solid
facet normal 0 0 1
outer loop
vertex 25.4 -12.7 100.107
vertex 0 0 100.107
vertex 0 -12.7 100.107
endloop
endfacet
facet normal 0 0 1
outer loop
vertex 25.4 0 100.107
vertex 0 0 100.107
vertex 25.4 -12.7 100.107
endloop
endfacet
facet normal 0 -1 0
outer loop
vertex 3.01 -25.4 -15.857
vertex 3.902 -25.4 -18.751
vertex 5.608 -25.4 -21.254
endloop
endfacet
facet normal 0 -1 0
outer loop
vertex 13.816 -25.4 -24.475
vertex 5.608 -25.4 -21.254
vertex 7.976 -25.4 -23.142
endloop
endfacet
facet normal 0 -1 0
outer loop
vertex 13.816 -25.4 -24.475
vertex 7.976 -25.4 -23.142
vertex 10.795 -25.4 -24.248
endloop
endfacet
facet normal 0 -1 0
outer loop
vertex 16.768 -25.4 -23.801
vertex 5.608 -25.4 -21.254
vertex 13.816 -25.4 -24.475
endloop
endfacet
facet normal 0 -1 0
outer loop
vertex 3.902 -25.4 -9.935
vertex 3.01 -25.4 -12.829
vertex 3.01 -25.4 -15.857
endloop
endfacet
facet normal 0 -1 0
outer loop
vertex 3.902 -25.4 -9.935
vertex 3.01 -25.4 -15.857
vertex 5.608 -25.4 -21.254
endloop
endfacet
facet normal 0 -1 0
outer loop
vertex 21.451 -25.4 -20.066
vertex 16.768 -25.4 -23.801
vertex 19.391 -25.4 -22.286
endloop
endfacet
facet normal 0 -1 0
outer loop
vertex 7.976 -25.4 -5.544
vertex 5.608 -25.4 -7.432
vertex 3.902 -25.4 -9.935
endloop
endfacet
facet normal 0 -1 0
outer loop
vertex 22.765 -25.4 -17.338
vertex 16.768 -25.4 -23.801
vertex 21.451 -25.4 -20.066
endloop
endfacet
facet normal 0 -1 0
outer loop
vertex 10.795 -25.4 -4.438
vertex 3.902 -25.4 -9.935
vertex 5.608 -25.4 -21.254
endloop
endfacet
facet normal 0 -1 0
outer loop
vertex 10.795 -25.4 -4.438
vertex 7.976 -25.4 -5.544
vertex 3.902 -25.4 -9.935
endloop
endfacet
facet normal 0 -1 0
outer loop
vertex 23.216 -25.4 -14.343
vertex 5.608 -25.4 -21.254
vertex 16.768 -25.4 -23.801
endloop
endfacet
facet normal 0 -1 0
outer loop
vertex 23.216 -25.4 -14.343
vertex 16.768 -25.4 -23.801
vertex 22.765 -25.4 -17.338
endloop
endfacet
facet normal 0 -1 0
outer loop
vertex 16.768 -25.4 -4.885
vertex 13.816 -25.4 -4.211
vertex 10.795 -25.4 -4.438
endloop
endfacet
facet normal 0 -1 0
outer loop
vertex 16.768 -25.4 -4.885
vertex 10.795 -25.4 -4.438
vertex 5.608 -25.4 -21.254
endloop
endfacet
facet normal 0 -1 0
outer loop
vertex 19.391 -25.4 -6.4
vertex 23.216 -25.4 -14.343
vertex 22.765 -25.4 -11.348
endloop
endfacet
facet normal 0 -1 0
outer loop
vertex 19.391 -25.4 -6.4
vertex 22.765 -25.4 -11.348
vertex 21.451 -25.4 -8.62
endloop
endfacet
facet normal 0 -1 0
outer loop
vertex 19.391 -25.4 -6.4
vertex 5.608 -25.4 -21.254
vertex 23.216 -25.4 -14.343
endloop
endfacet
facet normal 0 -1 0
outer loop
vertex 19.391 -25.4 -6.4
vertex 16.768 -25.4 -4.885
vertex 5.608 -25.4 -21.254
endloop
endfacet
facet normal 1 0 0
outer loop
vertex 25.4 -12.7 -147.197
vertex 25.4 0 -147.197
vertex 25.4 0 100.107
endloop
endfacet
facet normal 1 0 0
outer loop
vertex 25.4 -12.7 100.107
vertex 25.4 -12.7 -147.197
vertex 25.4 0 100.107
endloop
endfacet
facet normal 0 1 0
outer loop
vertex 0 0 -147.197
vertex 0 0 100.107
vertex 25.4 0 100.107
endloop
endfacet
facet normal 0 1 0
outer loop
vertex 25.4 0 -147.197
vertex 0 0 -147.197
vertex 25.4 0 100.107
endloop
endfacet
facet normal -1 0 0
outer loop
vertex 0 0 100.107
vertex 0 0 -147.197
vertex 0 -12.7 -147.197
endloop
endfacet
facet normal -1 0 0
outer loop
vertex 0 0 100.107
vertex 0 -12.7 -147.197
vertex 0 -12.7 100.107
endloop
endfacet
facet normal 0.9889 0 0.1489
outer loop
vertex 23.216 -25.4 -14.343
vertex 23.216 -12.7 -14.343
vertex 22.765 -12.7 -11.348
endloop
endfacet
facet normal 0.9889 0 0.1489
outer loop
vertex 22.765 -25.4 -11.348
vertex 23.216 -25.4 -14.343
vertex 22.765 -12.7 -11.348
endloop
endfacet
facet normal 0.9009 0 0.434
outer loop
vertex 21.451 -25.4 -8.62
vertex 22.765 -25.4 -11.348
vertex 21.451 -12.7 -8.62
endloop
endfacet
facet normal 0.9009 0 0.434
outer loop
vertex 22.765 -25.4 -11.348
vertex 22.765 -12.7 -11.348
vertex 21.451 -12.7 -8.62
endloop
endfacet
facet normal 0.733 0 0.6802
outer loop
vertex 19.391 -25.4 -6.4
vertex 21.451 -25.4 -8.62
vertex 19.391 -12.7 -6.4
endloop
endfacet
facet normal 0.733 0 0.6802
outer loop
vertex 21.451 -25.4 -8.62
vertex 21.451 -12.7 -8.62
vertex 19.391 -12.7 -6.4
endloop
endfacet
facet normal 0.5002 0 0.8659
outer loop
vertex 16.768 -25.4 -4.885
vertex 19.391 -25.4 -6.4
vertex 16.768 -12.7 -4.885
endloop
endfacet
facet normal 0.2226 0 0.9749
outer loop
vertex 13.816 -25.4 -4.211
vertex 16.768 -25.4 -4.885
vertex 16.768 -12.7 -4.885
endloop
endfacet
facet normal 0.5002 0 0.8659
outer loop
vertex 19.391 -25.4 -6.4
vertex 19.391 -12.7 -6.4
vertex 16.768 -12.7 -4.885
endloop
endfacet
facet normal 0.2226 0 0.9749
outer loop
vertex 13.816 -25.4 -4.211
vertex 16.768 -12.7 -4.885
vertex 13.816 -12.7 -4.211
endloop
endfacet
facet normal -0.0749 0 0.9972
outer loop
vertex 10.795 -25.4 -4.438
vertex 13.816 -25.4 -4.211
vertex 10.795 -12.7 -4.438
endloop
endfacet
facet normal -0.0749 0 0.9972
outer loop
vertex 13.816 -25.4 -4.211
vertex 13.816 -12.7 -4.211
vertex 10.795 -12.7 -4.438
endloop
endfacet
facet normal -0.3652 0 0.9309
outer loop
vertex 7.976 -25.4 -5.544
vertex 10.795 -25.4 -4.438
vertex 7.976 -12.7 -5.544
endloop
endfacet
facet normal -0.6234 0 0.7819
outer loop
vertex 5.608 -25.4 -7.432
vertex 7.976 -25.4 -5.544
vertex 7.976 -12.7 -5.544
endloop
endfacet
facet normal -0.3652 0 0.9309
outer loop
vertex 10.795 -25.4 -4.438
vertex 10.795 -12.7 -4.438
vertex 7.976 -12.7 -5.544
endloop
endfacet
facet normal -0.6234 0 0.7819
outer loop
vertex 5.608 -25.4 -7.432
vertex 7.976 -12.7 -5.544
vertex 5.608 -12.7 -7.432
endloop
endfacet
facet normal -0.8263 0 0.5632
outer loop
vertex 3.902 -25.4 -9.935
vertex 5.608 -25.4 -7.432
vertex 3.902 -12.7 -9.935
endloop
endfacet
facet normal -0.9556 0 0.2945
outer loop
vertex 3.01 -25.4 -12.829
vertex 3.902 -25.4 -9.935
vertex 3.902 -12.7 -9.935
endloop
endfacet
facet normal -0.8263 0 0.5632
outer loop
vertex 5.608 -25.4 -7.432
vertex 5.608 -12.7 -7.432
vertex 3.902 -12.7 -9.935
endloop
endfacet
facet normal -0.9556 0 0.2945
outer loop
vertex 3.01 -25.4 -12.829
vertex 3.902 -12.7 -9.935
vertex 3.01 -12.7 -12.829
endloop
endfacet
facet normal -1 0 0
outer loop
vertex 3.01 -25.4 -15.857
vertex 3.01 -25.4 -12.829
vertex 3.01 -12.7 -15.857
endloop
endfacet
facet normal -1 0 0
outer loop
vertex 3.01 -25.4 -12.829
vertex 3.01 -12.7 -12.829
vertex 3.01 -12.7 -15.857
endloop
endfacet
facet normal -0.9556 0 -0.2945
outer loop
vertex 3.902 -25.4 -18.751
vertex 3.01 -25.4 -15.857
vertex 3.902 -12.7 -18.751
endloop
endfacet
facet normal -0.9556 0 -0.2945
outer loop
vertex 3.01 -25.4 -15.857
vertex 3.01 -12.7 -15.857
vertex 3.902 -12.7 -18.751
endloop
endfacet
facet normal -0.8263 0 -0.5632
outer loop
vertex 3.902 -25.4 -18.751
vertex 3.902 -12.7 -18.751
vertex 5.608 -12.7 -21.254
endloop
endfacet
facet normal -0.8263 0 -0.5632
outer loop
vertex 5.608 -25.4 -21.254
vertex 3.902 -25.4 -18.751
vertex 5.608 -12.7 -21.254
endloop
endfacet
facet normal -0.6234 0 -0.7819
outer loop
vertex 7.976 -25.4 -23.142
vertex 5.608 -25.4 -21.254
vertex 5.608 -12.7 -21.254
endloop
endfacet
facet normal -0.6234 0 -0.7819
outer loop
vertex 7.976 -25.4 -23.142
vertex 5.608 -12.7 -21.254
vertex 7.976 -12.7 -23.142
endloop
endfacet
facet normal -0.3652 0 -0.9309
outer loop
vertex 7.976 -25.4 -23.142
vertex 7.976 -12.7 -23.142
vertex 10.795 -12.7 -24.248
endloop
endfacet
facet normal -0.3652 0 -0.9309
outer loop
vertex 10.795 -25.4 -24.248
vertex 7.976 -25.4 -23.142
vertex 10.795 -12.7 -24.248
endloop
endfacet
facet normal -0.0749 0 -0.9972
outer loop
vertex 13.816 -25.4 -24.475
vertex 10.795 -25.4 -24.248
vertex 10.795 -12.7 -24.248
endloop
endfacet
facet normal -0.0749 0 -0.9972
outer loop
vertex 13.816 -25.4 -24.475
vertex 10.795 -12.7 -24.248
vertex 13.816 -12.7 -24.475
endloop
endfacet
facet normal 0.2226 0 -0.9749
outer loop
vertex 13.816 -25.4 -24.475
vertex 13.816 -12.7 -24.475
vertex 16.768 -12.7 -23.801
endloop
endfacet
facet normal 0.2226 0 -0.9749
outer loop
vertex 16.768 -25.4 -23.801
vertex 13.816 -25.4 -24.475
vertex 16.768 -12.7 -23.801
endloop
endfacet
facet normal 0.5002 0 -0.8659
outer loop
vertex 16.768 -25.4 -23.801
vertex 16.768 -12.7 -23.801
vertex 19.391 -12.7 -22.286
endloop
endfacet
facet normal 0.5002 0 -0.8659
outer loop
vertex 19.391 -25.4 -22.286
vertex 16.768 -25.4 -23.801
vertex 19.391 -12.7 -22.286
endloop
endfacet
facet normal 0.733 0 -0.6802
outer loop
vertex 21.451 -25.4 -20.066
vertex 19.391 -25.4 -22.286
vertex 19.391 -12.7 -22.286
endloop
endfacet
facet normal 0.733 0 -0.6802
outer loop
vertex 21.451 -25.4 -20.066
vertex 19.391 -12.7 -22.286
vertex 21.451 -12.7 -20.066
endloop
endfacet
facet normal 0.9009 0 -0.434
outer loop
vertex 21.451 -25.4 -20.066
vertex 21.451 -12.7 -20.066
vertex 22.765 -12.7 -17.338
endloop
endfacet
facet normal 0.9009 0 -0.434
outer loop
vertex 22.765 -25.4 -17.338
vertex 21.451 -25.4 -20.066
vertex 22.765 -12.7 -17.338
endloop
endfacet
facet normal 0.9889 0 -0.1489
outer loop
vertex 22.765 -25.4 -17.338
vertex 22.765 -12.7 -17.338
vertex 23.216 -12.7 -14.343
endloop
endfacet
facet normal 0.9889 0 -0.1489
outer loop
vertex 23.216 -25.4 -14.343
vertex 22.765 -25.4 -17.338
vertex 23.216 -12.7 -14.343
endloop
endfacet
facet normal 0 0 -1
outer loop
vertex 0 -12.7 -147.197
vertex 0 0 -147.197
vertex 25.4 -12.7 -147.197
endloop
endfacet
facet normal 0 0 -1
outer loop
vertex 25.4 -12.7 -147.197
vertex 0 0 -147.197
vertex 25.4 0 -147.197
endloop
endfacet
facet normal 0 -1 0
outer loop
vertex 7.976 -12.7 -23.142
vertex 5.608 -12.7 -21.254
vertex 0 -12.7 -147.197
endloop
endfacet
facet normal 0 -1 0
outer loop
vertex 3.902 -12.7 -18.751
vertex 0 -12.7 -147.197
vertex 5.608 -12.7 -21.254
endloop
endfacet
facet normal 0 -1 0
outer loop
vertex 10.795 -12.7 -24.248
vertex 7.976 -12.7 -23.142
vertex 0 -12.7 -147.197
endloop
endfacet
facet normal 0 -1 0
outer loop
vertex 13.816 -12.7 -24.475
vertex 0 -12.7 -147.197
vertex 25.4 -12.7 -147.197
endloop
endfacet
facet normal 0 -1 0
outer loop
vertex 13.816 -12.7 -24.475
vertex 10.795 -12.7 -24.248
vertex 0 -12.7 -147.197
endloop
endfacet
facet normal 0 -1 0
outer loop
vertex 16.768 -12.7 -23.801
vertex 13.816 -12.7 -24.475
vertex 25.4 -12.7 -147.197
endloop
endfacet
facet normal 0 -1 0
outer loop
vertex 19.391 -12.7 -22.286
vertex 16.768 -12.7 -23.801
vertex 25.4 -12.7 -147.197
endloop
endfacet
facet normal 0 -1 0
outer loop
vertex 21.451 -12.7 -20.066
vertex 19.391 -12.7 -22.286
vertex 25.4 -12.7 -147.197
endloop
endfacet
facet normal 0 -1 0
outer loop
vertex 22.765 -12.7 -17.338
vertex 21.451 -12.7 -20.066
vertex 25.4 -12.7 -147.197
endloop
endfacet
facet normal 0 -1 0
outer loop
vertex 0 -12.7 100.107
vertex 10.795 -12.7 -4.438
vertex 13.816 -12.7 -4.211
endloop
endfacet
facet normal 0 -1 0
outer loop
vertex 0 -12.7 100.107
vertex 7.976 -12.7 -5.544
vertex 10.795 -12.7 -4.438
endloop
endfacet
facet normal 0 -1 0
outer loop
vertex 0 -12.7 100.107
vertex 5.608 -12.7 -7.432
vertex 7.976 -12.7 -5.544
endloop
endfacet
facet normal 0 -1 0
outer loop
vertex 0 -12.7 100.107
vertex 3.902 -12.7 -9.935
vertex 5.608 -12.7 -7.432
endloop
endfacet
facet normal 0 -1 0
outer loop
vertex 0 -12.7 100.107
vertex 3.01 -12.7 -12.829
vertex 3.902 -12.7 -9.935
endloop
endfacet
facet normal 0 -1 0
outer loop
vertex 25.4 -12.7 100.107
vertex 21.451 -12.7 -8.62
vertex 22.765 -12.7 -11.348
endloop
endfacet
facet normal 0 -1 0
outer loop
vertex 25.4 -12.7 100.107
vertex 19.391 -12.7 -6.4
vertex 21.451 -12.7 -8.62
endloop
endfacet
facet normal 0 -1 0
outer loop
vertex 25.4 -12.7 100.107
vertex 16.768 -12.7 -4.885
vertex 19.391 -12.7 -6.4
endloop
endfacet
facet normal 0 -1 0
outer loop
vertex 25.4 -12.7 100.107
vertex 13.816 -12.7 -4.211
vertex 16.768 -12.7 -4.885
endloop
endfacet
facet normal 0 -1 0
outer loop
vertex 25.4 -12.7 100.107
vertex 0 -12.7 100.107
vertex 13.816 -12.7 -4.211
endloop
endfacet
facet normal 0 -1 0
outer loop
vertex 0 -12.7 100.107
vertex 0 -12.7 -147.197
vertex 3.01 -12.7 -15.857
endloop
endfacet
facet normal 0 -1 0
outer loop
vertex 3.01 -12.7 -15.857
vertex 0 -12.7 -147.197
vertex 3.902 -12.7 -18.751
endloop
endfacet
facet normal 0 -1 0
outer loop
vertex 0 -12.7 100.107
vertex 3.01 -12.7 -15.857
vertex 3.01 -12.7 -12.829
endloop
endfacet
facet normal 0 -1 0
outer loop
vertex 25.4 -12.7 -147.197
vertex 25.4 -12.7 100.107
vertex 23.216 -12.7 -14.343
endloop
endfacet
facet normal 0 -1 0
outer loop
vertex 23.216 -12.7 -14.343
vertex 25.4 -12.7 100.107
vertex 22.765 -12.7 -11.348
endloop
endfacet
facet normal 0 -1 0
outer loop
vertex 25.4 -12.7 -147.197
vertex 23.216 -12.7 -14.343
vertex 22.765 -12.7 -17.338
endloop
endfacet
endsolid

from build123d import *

# Parameters (mm, degrees)
F0_W     = 25.4
F0_H     = 247.304687
F0_R     = 10.16
F1_DEPTH = 12.7
F2_DEPTH = 25.4


with BuildPart() as f1:
    # F0 (on Front) → F1 (new body)
    with BuildSketch(Plane.XZ):
        with Locations((12.7, -23.54492)):
            Rectangle(F0_W, F0_H)
        with Locations((13.056295, -14.342986)):
            Circle(F0_R, mode=Mode.SUBTRACT)
    extrude(amount=F1_DEPTH)

    # F0 (on Front) → F2 (join)
    with BuildSketch(Plane.XZ):
        with Locations((13.056295, -14.342986)):
            Circle(F0_R)
    extrude(amount=F2_DEPTH)


solid = f1.part
